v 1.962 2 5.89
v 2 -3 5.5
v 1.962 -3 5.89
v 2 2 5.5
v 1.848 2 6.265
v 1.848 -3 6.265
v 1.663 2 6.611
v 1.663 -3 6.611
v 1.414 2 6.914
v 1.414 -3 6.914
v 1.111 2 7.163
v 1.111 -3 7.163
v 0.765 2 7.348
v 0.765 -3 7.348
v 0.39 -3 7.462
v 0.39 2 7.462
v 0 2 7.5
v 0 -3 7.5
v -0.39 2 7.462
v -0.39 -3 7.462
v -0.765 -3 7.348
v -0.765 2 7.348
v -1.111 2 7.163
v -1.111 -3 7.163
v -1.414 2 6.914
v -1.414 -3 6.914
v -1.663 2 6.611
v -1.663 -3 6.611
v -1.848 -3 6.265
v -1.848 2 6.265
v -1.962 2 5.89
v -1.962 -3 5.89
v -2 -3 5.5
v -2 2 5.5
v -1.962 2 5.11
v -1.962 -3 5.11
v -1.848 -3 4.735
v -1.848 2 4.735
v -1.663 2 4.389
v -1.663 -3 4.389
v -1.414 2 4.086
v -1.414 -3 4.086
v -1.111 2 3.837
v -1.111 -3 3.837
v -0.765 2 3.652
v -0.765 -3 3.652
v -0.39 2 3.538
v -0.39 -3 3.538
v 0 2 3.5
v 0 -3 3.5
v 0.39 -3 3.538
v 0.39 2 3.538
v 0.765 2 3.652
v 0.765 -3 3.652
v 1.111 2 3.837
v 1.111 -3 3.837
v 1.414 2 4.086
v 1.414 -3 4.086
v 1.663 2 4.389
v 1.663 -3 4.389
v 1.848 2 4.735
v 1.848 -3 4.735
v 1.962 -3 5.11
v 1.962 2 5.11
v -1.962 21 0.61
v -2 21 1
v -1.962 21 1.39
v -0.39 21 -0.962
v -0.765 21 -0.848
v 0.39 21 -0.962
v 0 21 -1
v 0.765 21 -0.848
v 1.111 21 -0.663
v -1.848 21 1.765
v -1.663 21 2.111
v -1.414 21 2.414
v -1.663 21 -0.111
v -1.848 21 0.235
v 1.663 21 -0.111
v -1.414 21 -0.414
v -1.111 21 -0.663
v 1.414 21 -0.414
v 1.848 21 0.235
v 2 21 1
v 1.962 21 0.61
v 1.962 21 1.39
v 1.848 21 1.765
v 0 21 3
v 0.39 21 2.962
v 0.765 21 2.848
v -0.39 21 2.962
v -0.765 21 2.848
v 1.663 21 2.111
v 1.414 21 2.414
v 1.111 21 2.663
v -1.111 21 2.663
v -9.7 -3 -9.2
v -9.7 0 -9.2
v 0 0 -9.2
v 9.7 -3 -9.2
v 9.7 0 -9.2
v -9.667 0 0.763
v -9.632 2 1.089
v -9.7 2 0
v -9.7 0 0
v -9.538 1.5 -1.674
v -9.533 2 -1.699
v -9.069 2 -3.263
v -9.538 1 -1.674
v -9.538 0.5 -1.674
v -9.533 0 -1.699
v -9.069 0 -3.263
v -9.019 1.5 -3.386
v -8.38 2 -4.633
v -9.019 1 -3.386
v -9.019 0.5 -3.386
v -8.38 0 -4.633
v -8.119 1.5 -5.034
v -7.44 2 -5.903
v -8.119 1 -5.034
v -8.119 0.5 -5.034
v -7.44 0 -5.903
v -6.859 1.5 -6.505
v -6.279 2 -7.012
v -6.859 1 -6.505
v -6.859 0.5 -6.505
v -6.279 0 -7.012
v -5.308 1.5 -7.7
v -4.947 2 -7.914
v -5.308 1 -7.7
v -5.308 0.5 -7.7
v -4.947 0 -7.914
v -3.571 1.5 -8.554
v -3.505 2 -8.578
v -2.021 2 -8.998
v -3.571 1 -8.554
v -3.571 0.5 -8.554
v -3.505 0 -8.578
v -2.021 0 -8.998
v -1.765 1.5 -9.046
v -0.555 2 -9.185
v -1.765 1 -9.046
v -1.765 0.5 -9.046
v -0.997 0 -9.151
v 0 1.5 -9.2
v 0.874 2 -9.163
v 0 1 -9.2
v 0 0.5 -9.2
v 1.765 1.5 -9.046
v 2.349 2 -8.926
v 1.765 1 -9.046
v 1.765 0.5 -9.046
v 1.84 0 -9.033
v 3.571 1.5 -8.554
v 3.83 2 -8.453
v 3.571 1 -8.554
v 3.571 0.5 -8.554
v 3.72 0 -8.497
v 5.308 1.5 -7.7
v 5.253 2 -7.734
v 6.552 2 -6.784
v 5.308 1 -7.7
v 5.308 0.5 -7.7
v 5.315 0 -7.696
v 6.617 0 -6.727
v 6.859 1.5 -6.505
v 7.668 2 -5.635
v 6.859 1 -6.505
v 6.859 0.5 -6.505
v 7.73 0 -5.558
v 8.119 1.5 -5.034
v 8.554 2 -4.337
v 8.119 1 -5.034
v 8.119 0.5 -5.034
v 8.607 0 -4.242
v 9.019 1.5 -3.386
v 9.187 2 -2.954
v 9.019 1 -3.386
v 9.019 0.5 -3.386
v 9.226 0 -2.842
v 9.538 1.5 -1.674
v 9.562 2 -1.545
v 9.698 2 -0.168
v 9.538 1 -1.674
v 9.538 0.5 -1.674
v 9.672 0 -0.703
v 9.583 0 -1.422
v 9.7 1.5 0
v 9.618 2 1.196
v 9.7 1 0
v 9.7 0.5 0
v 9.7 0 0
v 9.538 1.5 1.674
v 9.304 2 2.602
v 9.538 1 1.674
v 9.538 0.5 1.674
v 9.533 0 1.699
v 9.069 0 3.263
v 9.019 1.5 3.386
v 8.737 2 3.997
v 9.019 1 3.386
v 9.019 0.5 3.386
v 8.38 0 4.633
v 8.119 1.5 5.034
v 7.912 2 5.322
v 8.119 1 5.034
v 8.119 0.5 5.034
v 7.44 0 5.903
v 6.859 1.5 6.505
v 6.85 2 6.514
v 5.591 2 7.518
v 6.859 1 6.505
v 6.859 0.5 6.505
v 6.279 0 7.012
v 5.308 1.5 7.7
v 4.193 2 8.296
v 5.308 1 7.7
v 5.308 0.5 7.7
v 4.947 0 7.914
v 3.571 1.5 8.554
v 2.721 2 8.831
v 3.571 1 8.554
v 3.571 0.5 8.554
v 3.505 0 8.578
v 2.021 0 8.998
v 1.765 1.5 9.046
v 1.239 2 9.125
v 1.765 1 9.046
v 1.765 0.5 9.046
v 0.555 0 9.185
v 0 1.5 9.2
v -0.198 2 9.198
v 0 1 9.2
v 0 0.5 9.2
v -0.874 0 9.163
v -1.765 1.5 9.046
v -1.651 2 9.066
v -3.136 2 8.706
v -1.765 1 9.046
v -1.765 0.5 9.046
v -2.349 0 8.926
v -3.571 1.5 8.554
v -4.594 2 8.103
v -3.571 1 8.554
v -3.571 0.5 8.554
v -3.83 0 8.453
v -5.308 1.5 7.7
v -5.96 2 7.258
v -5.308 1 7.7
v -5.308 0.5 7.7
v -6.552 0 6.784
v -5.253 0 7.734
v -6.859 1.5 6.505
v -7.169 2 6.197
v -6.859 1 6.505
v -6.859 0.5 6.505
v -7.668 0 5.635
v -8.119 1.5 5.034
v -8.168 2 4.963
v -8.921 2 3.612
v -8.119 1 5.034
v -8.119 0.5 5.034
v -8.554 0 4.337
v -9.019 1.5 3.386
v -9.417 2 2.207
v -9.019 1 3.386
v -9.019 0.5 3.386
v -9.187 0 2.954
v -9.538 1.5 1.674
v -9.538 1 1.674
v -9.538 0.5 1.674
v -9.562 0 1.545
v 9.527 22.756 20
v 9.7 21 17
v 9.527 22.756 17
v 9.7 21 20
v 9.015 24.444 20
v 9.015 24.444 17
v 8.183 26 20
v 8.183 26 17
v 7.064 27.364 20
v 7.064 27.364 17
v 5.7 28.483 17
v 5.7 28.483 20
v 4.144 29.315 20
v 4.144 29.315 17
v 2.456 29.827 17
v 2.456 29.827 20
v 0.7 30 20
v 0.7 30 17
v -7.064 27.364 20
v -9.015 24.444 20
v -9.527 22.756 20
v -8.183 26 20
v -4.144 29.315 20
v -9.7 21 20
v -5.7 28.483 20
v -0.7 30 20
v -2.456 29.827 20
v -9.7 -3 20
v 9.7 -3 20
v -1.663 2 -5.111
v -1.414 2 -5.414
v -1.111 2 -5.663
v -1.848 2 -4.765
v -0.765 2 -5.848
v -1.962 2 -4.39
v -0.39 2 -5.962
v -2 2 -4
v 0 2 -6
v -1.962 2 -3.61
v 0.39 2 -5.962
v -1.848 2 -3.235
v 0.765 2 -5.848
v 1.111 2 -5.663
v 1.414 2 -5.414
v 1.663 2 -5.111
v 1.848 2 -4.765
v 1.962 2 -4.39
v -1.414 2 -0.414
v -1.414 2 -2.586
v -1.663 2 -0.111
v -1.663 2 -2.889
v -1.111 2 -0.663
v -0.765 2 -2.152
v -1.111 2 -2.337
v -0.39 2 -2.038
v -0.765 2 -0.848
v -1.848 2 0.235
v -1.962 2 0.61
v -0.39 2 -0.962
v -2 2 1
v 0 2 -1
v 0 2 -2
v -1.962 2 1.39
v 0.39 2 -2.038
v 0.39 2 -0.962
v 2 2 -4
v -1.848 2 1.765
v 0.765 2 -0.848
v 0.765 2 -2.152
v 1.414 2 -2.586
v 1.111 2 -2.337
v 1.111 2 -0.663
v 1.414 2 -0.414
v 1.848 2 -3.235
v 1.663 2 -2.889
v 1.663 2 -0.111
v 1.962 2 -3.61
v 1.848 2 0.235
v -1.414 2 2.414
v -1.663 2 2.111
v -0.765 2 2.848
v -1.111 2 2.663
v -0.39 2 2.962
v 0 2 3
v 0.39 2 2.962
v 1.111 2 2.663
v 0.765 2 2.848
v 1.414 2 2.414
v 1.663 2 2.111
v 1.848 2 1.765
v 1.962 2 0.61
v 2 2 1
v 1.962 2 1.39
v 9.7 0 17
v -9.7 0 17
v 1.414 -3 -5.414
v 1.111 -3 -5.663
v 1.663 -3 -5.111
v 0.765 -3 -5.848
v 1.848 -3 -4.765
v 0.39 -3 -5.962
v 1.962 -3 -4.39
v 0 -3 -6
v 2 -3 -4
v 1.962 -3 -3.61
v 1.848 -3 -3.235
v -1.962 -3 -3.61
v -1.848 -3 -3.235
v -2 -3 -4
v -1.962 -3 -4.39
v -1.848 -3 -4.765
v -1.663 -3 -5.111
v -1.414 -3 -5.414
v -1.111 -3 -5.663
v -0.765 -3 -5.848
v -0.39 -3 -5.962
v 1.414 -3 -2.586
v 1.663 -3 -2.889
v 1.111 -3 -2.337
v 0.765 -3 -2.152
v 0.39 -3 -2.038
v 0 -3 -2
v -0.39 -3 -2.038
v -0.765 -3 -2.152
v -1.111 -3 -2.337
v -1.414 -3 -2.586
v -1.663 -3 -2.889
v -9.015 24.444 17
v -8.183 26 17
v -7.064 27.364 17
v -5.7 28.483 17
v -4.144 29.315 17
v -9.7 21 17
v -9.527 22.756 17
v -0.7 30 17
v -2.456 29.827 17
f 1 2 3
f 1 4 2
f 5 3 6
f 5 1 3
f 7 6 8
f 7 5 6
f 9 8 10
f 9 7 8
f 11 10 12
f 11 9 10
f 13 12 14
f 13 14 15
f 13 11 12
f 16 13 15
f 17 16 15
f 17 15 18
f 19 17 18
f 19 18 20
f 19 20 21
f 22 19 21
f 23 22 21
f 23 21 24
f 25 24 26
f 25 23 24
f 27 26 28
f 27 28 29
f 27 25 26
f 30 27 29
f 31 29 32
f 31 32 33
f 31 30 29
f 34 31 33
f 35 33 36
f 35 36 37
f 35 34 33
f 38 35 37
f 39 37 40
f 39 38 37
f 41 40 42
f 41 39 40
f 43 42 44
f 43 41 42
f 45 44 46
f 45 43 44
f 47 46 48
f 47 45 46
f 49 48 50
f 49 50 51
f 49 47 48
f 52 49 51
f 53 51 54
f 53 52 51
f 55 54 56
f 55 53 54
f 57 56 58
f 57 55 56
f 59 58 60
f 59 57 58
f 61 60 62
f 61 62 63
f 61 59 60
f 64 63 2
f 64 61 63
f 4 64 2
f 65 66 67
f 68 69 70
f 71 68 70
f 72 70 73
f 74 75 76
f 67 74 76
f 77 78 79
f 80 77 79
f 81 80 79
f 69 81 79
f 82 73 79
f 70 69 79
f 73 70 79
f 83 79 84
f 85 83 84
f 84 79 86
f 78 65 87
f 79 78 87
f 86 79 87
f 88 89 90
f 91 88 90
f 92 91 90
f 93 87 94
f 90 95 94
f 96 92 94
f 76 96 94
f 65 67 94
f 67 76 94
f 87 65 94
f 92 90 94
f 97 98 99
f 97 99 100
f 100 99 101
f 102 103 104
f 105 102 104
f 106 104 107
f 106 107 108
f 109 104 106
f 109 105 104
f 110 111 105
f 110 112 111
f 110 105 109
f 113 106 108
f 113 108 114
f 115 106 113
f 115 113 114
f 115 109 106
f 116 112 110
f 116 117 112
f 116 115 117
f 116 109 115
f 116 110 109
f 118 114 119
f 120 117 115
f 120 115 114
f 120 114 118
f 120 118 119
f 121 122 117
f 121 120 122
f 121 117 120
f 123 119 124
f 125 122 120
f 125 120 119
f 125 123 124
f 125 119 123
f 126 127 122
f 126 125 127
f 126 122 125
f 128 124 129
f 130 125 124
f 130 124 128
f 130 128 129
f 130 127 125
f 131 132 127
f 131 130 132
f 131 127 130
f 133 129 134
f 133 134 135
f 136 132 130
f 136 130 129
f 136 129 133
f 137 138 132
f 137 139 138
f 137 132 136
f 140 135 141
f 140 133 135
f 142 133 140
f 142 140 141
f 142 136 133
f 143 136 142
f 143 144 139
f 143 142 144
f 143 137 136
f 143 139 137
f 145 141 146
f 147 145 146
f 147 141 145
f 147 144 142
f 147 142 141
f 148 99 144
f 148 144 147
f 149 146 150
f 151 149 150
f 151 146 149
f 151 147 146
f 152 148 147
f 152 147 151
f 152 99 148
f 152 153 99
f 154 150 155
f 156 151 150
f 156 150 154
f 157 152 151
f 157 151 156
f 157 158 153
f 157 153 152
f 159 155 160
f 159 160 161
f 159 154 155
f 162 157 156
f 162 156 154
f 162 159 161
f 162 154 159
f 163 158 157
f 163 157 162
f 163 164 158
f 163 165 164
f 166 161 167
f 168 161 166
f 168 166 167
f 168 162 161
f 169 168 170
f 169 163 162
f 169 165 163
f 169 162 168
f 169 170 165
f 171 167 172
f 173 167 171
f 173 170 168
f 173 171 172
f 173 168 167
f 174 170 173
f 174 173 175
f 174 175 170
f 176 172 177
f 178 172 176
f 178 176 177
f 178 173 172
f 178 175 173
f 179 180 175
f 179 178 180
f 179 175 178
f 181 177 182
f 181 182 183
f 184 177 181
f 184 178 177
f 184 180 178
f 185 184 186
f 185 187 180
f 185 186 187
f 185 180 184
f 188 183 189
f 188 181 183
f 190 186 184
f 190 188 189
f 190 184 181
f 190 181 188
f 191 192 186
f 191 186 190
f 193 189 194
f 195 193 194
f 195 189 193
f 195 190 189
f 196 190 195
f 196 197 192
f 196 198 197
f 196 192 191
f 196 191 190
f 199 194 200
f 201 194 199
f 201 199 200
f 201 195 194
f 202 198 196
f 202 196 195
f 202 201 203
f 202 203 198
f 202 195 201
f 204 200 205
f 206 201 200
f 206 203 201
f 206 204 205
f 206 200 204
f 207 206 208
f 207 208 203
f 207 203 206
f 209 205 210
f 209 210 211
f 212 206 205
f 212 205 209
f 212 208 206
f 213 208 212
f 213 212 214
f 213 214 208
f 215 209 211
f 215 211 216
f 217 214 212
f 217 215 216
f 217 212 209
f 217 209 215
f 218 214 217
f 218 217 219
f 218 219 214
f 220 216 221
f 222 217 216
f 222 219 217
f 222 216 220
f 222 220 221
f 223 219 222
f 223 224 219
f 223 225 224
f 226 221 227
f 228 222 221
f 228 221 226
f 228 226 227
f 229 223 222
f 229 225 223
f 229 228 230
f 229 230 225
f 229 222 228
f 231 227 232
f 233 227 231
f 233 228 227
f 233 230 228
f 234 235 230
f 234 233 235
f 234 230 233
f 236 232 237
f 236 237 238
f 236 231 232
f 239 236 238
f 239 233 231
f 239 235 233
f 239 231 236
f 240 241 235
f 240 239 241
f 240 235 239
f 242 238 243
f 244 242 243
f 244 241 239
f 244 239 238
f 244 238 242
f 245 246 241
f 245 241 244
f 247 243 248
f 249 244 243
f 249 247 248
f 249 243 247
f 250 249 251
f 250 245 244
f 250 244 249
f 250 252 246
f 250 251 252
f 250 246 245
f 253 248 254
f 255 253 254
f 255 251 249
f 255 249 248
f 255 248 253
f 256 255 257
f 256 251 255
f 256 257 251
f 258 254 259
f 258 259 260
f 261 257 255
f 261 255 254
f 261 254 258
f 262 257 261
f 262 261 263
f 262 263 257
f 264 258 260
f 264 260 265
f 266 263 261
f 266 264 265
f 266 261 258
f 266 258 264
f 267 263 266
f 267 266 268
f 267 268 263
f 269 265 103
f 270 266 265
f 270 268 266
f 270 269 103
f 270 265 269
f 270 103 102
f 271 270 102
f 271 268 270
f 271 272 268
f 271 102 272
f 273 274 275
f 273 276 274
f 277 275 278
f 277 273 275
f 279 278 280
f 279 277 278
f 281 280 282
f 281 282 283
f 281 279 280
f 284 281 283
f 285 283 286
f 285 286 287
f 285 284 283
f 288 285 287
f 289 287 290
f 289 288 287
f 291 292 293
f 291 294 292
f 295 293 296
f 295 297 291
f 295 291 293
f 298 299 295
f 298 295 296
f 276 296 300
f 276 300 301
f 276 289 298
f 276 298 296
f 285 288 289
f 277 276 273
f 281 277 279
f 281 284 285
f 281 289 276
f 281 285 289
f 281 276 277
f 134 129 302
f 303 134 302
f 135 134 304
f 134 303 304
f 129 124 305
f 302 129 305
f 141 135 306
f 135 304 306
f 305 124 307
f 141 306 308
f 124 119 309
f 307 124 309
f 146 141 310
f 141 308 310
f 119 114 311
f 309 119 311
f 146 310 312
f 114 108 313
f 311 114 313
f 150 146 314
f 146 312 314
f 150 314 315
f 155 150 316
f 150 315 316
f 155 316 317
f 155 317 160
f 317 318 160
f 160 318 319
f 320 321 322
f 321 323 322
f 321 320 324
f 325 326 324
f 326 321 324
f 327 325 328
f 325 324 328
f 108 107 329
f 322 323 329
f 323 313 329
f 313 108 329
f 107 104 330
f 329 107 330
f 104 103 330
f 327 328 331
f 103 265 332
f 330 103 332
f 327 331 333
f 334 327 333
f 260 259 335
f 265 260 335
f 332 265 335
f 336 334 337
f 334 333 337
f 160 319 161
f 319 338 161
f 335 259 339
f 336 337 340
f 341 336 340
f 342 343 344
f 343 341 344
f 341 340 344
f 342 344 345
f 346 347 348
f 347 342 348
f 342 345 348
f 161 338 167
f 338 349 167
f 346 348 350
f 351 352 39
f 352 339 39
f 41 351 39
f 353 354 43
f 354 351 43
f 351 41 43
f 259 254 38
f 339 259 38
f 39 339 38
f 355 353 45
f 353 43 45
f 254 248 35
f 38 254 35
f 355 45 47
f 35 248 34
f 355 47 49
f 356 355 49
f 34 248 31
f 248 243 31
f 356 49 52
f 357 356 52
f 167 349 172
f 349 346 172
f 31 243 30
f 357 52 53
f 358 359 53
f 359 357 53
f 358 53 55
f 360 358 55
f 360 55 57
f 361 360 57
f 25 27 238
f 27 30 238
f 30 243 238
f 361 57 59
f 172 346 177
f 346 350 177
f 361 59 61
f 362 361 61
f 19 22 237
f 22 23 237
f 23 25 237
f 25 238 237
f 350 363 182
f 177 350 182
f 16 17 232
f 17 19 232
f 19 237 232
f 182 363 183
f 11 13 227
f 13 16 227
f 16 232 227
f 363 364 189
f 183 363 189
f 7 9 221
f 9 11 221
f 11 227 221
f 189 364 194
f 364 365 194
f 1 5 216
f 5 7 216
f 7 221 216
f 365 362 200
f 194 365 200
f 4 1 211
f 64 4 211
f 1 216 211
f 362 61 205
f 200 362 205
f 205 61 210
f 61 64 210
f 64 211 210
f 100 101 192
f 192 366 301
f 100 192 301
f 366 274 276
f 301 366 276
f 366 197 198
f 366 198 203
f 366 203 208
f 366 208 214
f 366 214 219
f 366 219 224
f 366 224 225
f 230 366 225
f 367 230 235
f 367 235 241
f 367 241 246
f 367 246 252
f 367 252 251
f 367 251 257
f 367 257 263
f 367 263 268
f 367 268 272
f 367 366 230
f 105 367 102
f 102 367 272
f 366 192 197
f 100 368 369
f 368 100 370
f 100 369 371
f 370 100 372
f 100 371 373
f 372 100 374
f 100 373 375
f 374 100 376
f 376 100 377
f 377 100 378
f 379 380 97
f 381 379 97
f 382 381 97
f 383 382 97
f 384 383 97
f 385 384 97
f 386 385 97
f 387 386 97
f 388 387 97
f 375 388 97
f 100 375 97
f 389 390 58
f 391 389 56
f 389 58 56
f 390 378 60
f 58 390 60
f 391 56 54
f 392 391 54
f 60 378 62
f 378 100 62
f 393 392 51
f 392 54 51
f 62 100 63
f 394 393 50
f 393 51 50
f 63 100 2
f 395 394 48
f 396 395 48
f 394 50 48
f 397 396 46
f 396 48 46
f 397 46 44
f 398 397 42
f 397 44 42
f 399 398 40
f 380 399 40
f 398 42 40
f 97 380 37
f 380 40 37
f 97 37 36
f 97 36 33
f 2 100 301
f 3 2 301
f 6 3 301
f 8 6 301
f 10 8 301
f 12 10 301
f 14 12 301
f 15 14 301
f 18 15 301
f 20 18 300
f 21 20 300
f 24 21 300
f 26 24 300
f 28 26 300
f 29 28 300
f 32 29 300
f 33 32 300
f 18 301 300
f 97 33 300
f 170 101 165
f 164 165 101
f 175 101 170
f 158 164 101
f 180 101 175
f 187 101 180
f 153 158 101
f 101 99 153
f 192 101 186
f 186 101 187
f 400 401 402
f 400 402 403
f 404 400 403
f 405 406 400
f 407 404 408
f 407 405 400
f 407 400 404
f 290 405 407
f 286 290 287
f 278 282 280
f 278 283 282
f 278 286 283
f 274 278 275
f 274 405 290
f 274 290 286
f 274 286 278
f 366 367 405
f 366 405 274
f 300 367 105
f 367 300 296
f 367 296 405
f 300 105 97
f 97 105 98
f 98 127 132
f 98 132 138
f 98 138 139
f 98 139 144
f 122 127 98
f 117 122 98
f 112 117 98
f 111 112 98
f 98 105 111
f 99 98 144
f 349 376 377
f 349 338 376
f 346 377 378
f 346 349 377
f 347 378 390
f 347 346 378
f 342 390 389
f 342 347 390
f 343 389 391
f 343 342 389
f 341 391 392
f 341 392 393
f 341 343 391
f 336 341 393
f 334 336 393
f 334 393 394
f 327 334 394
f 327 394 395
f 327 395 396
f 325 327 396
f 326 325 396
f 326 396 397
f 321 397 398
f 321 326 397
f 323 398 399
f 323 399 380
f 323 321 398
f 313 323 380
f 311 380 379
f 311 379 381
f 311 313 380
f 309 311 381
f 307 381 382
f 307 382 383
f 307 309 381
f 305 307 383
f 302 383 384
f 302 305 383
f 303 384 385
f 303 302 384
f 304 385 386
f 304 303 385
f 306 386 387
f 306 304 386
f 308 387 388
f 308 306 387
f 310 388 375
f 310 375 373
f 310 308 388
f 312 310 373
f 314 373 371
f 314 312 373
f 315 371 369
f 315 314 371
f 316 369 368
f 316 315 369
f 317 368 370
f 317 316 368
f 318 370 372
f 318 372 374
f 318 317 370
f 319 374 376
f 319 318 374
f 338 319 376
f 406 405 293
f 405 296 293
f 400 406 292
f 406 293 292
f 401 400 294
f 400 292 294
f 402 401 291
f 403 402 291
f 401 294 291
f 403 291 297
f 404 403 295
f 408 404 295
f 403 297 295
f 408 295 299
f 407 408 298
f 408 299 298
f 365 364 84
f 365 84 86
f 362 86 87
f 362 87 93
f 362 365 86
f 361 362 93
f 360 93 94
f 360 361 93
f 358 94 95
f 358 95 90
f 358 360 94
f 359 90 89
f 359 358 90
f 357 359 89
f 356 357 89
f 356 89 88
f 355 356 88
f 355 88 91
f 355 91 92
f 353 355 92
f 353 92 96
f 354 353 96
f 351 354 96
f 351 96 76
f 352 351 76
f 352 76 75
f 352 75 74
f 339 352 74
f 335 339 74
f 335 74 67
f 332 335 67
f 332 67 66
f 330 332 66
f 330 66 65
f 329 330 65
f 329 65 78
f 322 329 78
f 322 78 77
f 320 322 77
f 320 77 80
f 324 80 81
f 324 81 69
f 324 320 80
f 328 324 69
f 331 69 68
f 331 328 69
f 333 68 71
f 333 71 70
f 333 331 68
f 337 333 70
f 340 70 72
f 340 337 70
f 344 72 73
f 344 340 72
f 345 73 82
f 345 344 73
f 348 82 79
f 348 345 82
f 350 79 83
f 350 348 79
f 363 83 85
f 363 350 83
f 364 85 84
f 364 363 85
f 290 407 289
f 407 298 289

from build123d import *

# Parameters (mm, degrees)
F0_W     = 19.4
F0_H     = 3
F1_DEPTH = 30
F0_R     = 2
F2_DEPTH = 3
F3_DEPTH = 2
F4_DEPTH = 21
F5_R     = 9


with BuildPart() as f1:
    # F0 (on Front) → F1 (new body)
    with BuildSketch(Plane.XZ):
        with Locations((0, 18.5)):
            Rectangle(F0_W, F0_H)
    extrude(amount=-F1_DEPTH)

    # F0 (on Front) → F2 (join)
    with BuildSketch(Plane.XZ):
        with BuildLine():
            add(Edge.make_bspline(
                [(9.7, 0), (9.7, 9.1999999828), (1.82e-08, 9.2), (-9.6999999637, 9.2000000172), (-9.7, 3.44e-08)],
                knots=[0, 0, 0, 1.5707963249, 1.5707963249, 3.1415926498, 3.1415926498, 3.1415926498], degree=2, weights=[1, 0.7071067818, 1, 0.7071067818, 1]))
            Line((9.7, 0), (9.7, 17))
            Line((9.7, 17), (-9.7, 17))
            Line((-9.7, 17), (-9.7, 3.44e-08))
        make_face()
        with Locations((0, 18.5)):
            Rectangle(F0_W, F0_H)
        with BuildLine():
            Line((9.7, -9.2), (9.7, 0))
            add(Edge.make_bspline(
                [(0, -9.2), (9.7, -9.2), (9.7, 0)],
                knots=[4.7123889804, 4.7123889804, 4.7123889804, 6.2831853072, 6.2831853072, 6.2831853072], degree=2, weights=[1, 0.7071067812, 1]))
            Line((0, -9.2), (9.7, -9.2))
        make_face()
        with BuildLine():
            add(Edge.make_bspline(
                [(-9.7, 3.44e-08), (-9.7000000363, -9.2), (0, -9.2)],
                knots=[3.1415926498, 3.1415926498, 3.1415926498, 4.7123889804, 4.7123889804, 4.7123889804], degree=2, weights=[1, 0.7071067799, 1]))
            Line((-9.7, 3.44e-08), (-9.7, -9.2))
            Line((-9.7, -9.2), (0, -9.2))
        make_face()
        with BuildLine():
            add(Edge.make_bspline(
                [(0, -9.2), (9.7, -9.2), (9.7, 0)],
                knots=[4.7123889804, 4.7123889804, 4.7123889804, 6.2831853072, 6.2831853072, 6.2831853072], degree=2, weights=[1, 0.7071067812, 1]))
            add(Edge.make_bspline(
                [(9.7, 0), (9.7, 9.1999999828), (1.82e-08, 9.2), (-9.6999999637, 9.2000000172), (-9.7, 3.44e-08)],
                knots=[0, 0, 0, 1.5707963249, 1.5707963249, 3.1415926498, 3.1415926498, 3.1415926498], degree=2, weights=[1, 0.7071067818, 1, 0.7071067818, 1]))
            add(Edge.make_bspline(
                [(-9.7, 3.44e-08), (-9.7000000363, -9.2), (0, -9.2)],
                knots=[3.1415926498, 3.1415926498, 3.1415926498, 4.7123889804, 4.7123889804, 4.7123889804], degree=2, weights=[1, 0.7071067799, 1]))
        make_face()
        with Locations((0, -4)):
            Circle(F0_R, mode=Mode.SUBTRACT)
        with Locations((0, 1)):
            Circle(F0_R, mode=Mode.SUBTRACT)
        with Locations((0, 5.5)):
            Circle(F0_R, mode=Mode.SUBTRACT)
        with Locations((0, 1)):
            Circle(F0_R)
    extrude(amount=F2_DEPTH)

    # F0 (on Front) → F3 (join)
    with BuildSketch(Plane.XZ):
        with BuildLine():
            add(Edge.make_bspline(
                [(0, -9.2), (9.7, -9.2), (9.7, 0)],
                knots=[4.7123889804, 4.7123889804, 4.7123889804, 6.2831853072, 6.2831853072, 6.2831853072], degree=2, weights=[1, 0.7071067812, 1]))
            add(Edge.make_bspline(
                [(9.7, 0), (9.7, 9.1999999828), (1.82e-08, 9.2), (-9.6999999637, 9.2000000172), (-9.7, 3.44e-08)],
                knots=[0, 0, 0, 1.5707963249, 1.5707963249, 3.1415926498, 3.1415926498, 3.1415926498], degree=2, weights=[1, 0.7071067818, 1, 0.7071067818, 1]))
            add(Edge.make_bspline(
                [(-9.7, 3.44e-08), (-9.7000000363, -9.2), (0, -9.2)],
                knots=[3.1415926498, 3.1415926498, 3.1415926498, 4.7123889804, 4.7123889804, 4.7123889804], degree=2, weights=[1, 0.7071067799, 1]))
        make_face()
        with Locations((0, -4)):
            Circle(F0_R, mode=Mode.SUBTRACT)
        with Locations((0, 1)):
            Circle(F0_R, mode=Mode.SUBTRACT)
        with Locations((0, 5.5)):
            Circle(F0_R, mode=Mode.SUBTRACT)
    extrude(amount=-F3_DEPTH)

    # F0 (on Front) → F4 (join)
    with BuildSketch(Plane.XZ):
        with Locations((0, 1)):
            Circle(F0_R)
    extrude(amount=-F4_DEPTH)

    # F5
    f5_edges = [f1.edges().sort_by_distance(p)[0] for p in [
        (-9.7, 30, 18.5),
        (9.7, 30, 18.5),
    ]]
    fillet(f5_edges, radius=F5_R)


solid = f1.part
